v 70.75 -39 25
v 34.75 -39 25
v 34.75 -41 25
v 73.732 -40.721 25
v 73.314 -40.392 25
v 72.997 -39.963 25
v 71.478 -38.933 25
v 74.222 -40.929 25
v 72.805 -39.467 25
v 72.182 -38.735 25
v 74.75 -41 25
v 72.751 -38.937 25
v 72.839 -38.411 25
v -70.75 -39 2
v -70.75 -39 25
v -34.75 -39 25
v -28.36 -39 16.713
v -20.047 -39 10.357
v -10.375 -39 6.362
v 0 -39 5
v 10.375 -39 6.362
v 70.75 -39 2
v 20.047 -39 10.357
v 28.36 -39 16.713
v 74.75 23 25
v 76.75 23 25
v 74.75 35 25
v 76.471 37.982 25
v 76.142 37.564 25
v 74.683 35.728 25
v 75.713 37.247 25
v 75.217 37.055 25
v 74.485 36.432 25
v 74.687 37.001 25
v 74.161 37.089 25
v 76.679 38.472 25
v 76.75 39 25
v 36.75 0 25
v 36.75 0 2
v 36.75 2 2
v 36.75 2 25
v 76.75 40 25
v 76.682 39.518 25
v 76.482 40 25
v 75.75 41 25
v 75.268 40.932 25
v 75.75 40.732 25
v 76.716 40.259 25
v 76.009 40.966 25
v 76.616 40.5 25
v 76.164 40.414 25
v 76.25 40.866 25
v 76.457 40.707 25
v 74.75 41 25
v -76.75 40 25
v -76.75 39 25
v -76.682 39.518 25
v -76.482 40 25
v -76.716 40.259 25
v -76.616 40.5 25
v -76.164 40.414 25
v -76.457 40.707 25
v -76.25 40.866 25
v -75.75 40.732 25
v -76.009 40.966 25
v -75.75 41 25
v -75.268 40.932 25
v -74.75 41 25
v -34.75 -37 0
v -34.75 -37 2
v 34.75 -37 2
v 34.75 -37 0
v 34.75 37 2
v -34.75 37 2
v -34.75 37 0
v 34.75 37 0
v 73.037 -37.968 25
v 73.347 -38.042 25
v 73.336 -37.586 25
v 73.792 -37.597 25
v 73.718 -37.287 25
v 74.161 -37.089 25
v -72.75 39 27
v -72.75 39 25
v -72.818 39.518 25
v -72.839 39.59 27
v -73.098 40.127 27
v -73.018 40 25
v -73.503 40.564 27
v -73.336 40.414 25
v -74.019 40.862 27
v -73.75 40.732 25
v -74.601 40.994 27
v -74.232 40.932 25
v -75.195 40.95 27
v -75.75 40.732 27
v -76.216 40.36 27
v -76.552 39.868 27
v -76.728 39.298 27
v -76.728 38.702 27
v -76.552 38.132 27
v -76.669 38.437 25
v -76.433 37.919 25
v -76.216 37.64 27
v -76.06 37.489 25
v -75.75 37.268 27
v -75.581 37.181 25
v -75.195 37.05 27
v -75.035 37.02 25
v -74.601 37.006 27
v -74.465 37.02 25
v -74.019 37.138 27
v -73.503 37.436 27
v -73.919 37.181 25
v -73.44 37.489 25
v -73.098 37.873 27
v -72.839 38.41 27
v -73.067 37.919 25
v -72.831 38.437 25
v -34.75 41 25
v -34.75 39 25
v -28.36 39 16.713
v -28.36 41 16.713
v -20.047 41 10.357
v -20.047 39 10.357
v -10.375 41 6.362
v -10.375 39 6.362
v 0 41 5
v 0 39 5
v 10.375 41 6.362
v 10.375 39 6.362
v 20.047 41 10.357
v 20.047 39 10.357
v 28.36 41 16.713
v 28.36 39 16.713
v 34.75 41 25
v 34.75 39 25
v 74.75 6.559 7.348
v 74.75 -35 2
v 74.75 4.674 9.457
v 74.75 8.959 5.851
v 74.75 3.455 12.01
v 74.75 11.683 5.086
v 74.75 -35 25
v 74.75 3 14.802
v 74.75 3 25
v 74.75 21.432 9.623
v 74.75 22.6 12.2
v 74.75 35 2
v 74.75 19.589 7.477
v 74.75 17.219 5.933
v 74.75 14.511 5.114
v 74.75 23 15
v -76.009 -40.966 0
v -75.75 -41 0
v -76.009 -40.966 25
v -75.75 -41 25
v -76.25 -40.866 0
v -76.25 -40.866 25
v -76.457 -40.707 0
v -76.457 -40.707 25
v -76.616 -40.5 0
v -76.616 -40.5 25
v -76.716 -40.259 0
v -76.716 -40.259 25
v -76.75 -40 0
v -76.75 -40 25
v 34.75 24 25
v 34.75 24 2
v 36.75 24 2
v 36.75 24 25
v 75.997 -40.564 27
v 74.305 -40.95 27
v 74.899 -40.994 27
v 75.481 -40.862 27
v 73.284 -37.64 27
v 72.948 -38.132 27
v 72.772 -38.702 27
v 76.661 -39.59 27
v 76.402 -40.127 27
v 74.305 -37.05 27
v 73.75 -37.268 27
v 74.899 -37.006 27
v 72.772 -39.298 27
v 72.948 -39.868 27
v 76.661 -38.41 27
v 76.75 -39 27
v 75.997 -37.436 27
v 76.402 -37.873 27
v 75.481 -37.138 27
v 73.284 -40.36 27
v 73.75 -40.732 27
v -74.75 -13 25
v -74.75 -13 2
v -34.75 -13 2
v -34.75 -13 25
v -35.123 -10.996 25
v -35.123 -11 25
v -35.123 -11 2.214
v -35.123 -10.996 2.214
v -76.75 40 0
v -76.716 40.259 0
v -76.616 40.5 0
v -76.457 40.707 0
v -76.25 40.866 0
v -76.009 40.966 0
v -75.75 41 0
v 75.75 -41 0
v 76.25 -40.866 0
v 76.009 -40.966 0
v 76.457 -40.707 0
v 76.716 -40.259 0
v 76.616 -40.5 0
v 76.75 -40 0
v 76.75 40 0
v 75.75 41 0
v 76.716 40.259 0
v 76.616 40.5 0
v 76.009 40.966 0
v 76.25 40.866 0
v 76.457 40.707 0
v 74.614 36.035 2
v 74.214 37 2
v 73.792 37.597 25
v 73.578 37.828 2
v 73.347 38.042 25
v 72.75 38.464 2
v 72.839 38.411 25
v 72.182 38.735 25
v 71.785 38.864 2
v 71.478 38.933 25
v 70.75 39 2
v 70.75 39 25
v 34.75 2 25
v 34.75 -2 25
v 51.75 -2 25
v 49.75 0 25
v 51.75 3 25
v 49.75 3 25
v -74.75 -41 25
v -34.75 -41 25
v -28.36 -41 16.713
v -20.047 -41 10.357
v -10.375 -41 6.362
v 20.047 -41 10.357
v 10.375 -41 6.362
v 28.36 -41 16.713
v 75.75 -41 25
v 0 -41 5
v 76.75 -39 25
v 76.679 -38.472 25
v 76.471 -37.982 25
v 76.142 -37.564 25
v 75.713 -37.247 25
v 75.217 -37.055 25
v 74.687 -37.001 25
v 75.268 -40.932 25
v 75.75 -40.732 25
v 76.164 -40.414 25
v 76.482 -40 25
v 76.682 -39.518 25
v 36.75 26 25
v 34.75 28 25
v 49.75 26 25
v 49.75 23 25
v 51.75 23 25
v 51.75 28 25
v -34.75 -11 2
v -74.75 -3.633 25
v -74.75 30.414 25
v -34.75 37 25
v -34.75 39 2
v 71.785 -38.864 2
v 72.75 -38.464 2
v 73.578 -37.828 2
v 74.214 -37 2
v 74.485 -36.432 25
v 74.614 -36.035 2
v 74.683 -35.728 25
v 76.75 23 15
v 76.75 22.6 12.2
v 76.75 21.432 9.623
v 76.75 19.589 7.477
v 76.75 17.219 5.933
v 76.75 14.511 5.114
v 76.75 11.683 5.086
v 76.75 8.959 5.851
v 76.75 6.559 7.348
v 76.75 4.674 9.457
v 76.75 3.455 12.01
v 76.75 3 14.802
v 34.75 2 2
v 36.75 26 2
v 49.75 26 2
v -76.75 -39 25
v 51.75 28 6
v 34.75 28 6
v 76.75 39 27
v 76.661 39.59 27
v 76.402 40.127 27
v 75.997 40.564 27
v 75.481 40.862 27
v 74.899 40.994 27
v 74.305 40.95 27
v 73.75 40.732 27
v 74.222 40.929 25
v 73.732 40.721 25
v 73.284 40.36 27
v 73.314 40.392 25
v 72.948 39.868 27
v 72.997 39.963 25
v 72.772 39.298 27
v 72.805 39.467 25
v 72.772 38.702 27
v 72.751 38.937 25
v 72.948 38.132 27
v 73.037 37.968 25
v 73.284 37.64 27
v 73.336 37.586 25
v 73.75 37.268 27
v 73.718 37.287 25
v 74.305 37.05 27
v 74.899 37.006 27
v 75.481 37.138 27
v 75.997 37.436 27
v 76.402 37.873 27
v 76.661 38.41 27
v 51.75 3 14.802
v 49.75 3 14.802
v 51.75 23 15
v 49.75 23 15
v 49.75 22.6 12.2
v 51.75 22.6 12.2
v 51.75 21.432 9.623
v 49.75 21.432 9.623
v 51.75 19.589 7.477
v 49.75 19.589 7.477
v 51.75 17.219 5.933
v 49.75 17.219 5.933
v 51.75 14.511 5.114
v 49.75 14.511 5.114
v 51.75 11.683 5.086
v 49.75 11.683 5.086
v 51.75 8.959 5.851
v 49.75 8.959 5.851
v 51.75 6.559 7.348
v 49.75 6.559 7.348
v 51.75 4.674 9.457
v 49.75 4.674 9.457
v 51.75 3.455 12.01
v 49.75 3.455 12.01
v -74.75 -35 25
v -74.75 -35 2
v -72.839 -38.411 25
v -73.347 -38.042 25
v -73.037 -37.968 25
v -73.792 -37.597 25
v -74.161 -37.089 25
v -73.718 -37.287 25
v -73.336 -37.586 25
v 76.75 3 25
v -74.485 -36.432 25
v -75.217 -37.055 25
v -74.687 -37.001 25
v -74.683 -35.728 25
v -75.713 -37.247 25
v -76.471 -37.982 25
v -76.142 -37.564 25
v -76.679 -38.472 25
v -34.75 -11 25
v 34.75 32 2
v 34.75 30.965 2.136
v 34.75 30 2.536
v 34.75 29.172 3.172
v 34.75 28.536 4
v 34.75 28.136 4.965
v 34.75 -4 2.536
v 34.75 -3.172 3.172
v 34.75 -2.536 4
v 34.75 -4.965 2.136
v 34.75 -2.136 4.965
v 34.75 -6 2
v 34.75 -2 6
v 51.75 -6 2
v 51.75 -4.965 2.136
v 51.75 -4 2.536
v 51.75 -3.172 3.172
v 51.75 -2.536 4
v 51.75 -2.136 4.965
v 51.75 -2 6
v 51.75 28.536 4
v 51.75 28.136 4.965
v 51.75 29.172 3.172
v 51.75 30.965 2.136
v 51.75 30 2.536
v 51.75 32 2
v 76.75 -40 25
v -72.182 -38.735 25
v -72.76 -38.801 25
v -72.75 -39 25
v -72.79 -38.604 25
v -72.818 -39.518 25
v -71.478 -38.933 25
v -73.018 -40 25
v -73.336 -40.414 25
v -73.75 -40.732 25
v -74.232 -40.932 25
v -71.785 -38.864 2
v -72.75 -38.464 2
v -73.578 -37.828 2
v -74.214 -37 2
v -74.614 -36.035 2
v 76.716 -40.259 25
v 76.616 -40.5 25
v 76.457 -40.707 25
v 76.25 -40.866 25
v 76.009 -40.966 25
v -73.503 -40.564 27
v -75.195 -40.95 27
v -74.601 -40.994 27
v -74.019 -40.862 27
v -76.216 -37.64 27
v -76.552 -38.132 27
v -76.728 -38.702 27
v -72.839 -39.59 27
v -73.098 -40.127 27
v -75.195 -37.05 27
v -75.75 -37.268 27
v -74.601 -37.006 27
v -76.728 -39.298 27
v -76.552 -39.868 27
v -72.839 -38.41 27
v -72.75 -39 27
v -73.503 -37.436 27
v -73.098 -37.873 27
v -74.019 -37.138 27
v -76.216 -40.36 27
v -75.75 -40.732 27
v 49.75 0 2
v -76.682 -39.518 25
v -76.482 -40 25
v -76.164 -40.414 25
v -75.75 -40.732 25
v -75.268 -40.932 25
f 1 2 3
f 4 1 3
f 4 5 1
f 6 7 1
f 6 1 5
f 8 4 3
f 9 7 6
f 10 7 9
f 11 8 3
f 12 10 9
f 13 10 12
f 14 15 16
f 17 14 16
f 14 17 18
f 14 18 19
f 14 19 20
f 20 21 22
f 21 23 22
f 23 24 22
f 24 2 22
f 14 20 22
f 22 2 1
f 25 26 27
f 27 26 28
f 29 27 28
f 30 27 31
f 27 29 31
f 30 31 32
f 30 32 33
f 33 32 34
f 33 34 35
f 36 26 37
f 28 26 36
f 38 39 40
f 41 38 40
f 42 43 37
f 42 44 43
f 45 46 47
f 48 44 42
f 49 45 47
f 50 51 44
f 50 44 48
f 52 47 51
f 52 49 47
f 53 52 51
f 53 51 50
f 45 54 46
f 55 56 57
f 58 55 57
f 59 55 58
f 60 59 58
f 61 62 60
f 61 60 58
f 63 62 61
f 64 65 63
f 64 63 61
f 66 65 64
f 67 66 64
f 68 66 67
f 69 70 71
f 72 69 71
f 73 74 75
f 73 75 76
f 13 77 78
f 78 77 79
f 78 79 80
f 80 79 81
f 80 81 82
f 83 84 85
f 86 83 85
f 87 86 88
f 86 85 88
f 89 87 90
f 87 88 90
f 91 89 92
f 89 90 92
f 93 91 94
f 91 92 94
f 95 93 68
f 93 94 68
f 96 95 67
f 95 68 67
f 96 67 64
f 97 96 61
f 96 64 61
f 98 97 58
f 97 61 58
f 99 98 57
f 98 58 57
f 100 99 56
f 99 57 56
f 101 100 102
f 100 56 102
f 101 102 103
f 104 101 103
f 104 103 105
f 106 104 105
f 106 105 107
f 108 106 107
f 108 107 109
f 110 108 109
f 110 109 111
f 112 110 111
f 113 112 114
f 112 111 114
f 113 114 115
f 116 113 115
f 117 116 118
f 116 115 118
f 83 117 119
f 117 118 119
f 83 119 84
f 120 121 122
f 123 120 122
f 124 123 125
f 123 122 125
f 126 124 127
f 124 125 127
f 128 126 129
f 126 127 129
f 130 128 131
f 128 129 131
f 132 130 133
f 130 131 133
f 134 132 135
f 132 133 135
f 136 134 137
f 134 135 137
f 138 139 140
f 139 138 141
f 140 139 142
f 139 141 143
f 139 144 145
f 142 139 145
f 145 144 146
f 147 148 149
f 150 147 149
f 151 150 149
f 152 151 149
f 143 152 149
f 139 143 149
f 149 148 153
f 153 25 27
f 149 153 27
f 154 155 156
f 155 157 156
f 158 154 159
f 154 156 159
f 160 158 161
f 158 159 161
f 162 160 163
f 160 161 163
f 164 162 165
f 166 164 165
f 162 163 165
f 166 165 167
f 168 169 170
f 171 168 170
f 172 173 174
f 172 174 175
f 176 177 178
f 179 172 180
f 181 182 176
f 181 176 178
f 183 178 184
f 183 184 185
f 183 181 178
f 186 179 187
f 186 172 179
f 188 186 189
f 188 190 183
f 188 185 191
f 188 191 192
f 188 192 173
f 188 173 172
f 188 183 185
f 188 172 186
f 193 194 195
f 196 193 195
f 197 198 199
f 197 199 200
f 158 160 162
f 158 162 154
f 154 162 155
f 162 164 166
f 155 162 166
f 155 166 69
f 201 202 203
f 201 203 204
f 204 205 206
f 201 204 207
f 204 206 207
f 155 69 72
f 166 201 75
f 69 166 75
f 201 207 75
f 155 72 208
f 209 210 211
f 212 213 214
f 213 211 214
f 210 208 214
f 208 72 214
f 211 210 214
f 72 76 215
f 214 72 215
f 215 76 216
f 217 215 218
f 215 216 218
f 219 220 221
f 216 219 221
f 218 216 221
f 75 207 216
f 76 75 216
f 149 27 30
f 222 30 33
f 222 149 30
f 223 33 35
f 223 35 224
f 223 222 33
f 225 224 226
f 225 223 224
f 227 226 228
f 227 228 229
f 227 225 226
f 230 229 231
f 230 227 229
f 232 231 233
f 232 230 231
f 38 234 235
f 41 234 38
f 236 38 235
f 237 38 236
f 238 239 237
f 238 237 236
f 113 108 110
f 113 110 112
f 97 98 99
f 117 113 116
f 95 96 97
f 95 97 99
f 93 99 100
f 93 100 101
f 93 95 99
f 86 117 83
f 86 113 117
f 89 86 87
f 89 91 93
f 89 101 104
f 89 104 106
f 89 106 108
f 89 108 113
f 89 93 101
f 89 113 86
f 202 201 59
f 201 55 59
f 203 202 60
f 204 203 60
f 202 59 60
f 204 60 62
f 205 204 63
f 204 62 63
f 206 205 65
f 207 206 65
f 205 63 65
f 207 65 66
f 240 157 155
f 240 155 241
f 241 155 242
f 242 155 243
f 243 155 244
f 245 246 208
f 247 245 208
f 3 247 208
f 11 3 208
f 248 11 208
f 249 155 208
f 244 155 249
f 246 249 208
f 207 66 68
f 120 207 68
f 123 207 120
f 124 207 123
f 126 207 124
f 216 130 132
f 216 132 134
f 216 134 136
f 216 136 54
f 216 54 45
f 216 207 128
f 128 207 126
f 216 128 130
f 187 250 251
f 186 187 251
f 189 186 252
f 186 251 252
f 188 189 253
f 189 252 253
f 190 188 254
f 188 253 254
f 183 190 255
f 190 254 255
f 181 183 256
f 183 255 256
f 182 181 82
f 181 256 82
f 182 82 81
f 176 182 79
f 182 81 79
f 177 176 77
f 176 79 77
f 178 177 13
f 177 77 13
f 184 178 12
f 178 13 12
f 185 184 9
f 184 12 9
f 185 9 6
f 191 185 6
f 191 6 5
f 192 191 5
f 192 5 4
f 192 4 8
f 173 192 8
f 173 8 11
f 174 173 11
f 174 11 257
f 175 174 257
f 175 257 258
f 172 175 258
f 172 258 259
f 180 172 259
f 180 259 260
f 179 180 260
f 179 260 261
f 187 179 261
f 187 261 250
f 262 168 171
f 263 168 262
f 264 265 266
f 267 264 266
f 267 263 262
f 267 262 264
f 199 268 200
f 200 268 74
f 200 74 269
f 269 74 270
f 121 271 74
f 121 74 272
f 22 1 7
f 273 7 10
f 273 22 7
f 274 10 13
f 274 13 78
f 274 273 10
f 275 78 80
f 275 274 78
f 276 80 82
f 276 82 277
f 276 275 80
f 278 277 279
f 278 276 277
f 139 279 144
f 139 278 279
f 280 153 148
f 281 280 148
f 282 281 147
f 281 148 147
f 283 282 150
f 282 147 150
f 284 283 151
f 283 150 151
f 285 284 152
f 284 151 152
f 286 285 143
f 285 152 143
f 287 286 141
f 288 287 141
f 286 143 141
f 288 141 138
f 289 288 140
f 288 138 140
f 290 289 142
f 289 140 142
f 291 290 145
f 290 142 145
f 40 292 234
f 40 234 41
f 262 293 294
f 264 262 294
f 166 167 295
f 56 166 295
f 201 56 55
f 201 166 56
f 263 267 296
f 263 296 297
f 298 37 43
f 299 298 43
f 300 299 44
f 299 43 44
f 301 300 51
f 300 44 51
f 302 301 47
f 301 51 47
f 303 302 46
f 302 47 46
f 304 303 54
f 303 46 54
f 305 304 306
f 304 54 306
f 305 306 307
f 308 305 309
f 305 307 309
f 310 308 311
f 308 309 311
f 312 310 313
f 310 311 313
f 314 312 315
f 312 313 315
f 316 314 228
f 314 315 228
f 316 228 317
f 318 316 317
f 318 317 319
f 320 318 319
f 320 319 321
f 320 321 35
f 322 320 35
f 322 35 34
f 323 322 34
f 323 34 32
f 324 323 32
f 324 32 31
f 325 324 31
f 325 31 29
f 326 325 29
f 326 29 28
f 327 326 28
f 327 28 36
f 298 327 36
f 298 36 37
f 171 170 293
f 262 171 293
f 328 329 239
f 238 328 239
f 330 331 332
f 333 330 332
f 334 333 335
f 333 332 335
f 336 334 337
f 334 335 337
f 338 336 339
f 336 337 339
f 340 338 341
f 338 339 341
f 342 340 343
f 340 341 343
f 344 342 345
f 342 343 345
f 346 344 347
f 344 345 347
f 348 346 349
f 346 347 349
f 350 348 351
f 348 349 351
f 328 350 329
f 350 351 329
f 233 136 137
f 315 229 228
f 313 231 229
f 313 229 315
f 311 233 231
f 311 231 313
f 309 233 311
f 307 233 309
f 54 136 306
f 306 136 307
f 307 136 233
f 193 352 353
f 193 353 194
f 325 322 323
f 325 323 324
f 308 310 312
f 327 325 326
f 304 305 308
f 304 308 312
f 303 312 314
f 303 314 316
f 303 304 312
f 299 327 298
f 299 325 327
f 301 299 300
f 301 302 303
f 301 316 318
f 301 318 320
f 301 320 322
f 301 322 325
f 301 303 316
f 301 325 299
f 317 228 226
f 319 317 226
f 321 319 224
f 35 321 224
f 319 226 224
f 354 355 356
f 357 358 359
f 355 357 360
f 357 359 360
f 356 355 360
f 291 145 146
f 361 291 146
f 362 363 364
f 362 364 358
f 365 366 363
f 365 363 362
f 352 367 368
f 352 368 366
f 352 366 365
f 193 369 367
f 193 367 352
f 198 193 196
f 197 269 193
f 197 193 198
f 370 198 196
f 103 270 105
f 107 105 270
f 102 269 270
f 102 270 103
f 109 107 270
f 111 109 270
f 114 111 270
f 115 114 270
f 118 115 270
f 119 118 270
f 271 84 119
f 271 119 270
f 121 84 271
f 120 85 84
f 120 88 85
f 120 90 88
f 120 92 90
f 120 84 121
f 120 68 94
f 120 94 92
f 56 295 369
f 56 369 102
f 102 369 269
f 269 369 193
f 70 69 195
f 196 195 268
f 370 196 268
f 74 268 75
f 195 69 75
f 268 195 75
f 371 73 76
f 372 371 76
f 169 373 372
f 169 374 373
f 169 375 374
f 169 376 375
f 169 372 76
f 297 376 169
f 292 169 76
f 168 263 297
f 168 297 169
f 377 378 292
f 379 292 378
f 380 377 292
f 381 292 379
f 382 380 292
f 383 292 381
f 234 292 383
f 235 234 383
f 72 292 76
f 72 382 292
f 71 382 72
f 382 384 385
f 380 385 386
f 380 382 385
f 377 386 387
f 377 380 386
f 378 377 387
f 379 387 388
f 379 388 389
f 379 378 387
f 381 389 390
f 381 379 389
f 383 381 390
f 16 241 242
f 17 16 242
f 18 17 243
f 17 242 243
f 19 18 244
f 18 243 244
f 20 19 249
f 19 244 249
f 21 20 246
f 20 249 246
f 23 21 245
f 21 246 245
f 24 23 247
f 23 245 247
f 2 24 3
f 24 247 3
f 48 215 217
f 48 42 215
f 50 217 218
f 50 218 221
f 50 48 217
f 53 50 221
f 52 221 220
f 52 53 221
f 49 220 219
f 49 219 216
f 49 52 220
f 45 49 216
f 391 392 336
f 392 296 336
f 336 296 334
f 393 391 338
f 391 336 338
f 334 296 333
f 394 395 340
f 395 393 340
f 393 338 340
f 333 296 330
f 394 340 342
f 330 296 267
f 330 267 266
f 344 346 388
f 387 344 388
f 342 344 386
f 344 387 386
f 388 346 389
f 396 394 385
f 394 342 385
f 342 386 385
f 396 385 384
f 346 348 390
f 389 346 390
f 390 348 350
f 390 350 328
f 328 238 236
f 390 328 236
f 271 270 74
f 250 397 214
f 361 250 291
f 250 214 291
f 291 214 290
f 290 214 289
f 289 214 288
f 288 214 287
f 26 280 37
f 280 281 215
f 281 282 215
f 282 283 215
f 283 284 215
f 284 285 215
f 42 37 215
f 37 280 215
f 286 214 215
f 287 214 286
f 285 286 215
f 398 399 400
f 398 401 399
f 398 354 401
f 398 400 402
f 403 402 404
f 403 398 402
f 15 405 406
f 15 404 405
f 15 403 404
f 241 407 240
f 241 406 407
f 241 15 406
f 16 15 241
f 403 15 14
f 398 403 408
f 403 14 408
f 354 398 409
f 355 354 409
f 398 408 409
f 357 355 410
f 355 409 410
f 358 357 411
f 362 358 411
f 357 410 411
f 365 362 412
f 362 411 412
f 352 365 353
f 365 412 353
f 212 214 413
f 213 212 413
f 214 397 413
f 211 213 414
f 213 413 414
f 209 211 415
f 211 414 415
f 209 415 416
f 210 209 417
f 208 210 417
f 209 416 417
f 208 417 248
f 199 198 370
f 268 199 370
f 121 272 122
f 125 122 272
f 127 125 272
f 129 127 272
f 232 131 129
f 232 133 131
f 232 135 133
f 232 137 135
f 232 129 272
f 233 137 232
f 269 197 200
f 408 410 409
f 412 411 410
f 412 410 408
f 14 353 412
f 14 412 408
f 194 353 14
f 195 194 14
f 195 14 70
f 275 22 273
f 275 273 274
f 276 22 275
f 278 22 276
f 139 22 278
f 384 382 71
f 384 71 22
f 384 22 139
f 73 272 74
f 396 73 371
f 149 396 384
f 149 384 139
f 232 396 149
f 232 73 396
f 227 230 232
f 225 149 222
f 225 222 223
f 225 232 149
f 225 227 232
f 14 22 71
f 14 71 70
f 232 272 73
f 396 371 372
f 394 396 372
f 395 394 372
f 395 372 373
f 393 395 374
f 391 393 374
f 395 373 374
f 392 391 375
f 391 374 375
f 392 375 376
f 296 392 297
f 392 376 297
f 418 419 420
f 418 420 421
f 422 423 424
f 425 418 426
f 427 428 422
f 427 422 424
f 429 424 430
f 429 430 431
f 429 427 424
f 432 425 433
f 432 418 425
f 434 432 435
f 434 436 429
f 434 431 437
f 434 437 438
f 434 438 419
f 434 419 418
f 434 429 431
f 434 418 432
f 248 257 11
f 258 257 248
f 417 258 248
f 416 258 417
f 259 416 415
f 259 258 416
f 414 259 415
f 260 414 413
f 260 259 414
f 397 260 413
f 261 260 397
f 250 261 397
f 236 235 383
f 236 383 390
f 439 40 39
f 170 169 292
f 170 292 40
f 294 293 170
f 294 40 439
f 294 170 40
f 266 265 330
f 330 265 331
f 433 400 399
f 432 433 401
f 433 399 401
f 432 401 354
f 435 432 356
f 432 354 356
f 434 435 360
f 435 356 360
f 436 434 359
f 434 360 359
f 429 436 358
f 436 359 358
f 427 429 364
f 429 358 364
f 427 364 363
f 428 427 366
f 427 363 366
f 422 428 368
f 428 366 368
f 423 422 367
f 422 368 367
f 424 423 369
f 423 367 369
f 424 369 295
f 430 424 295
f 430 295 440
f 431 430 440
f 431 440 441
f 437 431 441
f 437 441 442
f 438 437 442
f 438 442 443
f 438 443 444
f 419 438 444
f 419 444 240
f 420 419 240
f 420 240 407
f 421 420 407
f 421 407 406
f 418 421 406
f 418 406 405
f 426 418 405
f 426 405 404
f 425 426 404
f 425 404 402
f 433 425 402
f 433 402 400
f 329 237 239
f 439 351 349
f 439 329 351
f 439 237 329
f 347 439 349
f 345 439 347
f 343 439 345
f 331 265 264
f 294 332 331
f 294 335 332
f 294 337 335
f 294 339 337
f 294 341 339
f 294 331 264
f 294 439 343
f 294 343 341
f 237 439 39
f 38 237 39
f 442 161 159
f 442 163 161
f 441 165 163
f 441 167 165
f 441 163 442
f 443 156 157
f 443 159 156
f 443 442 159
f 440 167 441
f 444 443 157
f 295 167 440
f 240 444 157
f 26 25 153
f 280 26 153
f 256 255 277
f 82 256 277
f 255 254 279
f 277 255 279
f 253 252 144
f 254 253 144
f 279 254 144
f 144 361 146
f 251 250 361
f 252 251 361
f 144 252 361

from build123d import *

# Parameters (mm, degrees)
F0_W         = 153.5
F0_H         = 82
F1_DEPTH     = 25
F2_W         = 149.5
F2_H         = 78
F3_DEPTH     = 23
F5_DEPTH     = 50
F6_W         = 40
F6_H         = 2
F7_DEPTH     = 23
F8_W         = 69.5
F8_H         = 74
F9_DEPTH     = 2.001
F12_DEPTH    = 25
F14_W        = 2
F14_H        = 26
F14_H_2      = 2
F15_DEPTH    = 23
F17_DEPTH    = 27.001
F19_DEPTH    = 82.001
F20_R        = 2
F21_DEPTH    = 2
F22_T1_DEPTH = 23
F22_T3_DEPTH = 17
F23_R        = 1


# Not quite as in the source:
# - a fillet or chamfer that OpenCascade refuses, or shapes differently, is made with other operations: its cross-section is extruded or revolved along the edge and cut away or added


with BuildPart() as f1:
    # F0 (on Top) → F1 (new body)
    with BuildSketch(Plane.XY):
        Rectangle(F0_W, F0_H)
    extrude(amount=F1_DEPTH)

    # F2 (on face) → F3 (cut)
    with BuildSketch(Plane.XY.offset(25)):
        Rectangle(F2_W, F2_H)
    extrude(amount=-F3_DEPTH, mode=Mode.SUBTRACT)

    # F4 (on face) → F5 (join)
    with BuildSketch(Plane.XZ.offset(-39)):
        Polygon((-34.75, 2), (-74.75, 25), (-74.75, 2), align=None)
    extrude(amount=F5_DEPTH)

    # F6 (on face) → F7 (join)
    with BuildSketch(Plane.XY.offset(2)):
        with Locations((-54.75, -12)):
            Rectangle(F6_W, F6_H)
    extrude(amount=F7_DEPTH)

    # F8 (on face) → F9 (cut, through all)
    with BuildSketch(Plane.XY.offset(2)):
        Rectangle(F8_W, F8_H)
    extrude(amount=-F9_DEPTH, mode=Mode.SUBTRACT)

    # F11 (on face) → F12 (join)
    with BuildSketch(Plane.XY.offset(25)):
        Polygon((-74.75, 39), (-74.75, 30.4142603609), (-34.75, 37), (-34.75, 39), align=None)
        Polygon((-74.75, -11), (-35.1230073053, -11), (-35.1229473745, -10.9961439342), (-74.75, -3.6334587345), align=None)
    extrude(amount=-F12_DEPTH)

    # F14 (on face) → F15 (join)
    with BuildSketch(Plane.XY.offset(2)):
        Polygon((36.75, 26), (49.75, 26), (51.75, 26), (51.75, 28), (34.75, 28), (34.75, 26), align=None)
        with Locations((50.75, 13)):
            Rectangle(F14_W, F14_H)
        Polygon((51.75, 0), (49.75, 0), (36.75, 0), (34.75, 0), (34.75, -2), (51.75, -2), align=None)
        with Locations((35.75, 25)):
            Rectangle(F14_W, F14_H_2)
        with Locations((35.75, 1)):
            Rectangle(F14_W, F14_H_2)
    extrude(amount=F15_DEPTH)

    # F16 (on face) → F17 (cut, through all)
    with BuildSketch(Plane(origin=(49.75, 0, 0), x_dir=(0, -1, 0), z_dir=(-1, 0, 0))):
        with BuildLine():
            Line((-3, 25), (-23, 25))
            Line((-23, 25), (-23, 15))
            ThreePointArc((-23, 15), (-13.0980438814, 4.9995097688), (-3, 14.8019609728))
            Line((-3, 14.8019609728), (-3, 25))
        make_face()
    extrude(amount=-F17_DEPTH, mode=Mode.SUBTRACT)

    # F18 (on face) → F19 (cut, through all)
    with BuildSketch(Plane.XZ.offset(41)):
        with BuildLine():
            Line((34.75, 25), (-34.75, 25))
            ThreePointArc((-34.75, 25), (0, 5), (34.75, 25))
        make_face()
    extrude(amount=-F19_DEPTH, mode=Mode.SUBTRACT)

    # F20 (on face) → F21 (join)
    with BuildSketch(Plane.XY.offset(25)):
        with Locations((-74.75, 39)):
            Circle(F20_R)
        with Locations((74.75, 39)):
            Circle(F20_R)
        with Locations((-74.75, -39)):
            Circle(F20_R)
        with Locations((74.75, -39)):
            Circle(F20_R)
    extrude(amount=F21_DEPTH)

    # F22: fillet of radius 4 on 5 edges, made by hand

    # F22_s2 → F22_t1 (join)
    with BuildSketch(Plane.XY.offset(2)):
        with BuildLine():
            ThreePointArc((-70.75, -39), (-73.5784271247, -37.8284271247), (-74.75, -35))
            Line((-74.75, -35), (-74.75, -39))
            Line((-74.75, -39), (-70.75, -39))
        make_face()
        with BuildLine():
            ThreePointArc((74.75, 35), (73.5784271247, 37.8284271247), (70.75, 39))
            Line((70.75, 39), (74.75, 39))
            Line((74.75, 39), (74.75, 35))
        make_face()
        with BuildLine():
            ThreePointArc((70.75, -39), (73.5784271247, -37.8284271247), (74.75, -35))
            Line((74.75, -35), (74.75, -39))
            Line((74.75, -39), (70.75, -39))
        make_face()
    extrude(amount=F22_T1_DEPTH)

    # F22_s4 → F22_t3 (join)
    with BuildSketch(Plane.YZ.offset(34.75)):
        with BuildLine():
            ThreePointArc((-6, 2), (-3.1715728753, 3.1715728753), (-2, 6))
            Line((-2, 6), (-2, 2))
            Line((-2, 2), (-6, 2))
        make_face()
        with BuildLine():
            ThreePointArc((32, 2), (29.1715728753, 3.1715728753), (28, 6))
            Line((28, 6), (28, 2))
            Line((28, 2), (32, 2))
        make_face()
    extrude(amount=F22_T3_DEPTH)

    # F23
    f23_edges = [f1.edges().sort_by_distance(p)[0] for p in [
        (76.75, -41, 12.5),
        (-76.75, -41, 12.5),
        (-76.75, 41, 12.5),
        (76.75, 41, 12.5),
    ]]
    fillet(f23_edges, radius=F23_R)


solid = f1.part
